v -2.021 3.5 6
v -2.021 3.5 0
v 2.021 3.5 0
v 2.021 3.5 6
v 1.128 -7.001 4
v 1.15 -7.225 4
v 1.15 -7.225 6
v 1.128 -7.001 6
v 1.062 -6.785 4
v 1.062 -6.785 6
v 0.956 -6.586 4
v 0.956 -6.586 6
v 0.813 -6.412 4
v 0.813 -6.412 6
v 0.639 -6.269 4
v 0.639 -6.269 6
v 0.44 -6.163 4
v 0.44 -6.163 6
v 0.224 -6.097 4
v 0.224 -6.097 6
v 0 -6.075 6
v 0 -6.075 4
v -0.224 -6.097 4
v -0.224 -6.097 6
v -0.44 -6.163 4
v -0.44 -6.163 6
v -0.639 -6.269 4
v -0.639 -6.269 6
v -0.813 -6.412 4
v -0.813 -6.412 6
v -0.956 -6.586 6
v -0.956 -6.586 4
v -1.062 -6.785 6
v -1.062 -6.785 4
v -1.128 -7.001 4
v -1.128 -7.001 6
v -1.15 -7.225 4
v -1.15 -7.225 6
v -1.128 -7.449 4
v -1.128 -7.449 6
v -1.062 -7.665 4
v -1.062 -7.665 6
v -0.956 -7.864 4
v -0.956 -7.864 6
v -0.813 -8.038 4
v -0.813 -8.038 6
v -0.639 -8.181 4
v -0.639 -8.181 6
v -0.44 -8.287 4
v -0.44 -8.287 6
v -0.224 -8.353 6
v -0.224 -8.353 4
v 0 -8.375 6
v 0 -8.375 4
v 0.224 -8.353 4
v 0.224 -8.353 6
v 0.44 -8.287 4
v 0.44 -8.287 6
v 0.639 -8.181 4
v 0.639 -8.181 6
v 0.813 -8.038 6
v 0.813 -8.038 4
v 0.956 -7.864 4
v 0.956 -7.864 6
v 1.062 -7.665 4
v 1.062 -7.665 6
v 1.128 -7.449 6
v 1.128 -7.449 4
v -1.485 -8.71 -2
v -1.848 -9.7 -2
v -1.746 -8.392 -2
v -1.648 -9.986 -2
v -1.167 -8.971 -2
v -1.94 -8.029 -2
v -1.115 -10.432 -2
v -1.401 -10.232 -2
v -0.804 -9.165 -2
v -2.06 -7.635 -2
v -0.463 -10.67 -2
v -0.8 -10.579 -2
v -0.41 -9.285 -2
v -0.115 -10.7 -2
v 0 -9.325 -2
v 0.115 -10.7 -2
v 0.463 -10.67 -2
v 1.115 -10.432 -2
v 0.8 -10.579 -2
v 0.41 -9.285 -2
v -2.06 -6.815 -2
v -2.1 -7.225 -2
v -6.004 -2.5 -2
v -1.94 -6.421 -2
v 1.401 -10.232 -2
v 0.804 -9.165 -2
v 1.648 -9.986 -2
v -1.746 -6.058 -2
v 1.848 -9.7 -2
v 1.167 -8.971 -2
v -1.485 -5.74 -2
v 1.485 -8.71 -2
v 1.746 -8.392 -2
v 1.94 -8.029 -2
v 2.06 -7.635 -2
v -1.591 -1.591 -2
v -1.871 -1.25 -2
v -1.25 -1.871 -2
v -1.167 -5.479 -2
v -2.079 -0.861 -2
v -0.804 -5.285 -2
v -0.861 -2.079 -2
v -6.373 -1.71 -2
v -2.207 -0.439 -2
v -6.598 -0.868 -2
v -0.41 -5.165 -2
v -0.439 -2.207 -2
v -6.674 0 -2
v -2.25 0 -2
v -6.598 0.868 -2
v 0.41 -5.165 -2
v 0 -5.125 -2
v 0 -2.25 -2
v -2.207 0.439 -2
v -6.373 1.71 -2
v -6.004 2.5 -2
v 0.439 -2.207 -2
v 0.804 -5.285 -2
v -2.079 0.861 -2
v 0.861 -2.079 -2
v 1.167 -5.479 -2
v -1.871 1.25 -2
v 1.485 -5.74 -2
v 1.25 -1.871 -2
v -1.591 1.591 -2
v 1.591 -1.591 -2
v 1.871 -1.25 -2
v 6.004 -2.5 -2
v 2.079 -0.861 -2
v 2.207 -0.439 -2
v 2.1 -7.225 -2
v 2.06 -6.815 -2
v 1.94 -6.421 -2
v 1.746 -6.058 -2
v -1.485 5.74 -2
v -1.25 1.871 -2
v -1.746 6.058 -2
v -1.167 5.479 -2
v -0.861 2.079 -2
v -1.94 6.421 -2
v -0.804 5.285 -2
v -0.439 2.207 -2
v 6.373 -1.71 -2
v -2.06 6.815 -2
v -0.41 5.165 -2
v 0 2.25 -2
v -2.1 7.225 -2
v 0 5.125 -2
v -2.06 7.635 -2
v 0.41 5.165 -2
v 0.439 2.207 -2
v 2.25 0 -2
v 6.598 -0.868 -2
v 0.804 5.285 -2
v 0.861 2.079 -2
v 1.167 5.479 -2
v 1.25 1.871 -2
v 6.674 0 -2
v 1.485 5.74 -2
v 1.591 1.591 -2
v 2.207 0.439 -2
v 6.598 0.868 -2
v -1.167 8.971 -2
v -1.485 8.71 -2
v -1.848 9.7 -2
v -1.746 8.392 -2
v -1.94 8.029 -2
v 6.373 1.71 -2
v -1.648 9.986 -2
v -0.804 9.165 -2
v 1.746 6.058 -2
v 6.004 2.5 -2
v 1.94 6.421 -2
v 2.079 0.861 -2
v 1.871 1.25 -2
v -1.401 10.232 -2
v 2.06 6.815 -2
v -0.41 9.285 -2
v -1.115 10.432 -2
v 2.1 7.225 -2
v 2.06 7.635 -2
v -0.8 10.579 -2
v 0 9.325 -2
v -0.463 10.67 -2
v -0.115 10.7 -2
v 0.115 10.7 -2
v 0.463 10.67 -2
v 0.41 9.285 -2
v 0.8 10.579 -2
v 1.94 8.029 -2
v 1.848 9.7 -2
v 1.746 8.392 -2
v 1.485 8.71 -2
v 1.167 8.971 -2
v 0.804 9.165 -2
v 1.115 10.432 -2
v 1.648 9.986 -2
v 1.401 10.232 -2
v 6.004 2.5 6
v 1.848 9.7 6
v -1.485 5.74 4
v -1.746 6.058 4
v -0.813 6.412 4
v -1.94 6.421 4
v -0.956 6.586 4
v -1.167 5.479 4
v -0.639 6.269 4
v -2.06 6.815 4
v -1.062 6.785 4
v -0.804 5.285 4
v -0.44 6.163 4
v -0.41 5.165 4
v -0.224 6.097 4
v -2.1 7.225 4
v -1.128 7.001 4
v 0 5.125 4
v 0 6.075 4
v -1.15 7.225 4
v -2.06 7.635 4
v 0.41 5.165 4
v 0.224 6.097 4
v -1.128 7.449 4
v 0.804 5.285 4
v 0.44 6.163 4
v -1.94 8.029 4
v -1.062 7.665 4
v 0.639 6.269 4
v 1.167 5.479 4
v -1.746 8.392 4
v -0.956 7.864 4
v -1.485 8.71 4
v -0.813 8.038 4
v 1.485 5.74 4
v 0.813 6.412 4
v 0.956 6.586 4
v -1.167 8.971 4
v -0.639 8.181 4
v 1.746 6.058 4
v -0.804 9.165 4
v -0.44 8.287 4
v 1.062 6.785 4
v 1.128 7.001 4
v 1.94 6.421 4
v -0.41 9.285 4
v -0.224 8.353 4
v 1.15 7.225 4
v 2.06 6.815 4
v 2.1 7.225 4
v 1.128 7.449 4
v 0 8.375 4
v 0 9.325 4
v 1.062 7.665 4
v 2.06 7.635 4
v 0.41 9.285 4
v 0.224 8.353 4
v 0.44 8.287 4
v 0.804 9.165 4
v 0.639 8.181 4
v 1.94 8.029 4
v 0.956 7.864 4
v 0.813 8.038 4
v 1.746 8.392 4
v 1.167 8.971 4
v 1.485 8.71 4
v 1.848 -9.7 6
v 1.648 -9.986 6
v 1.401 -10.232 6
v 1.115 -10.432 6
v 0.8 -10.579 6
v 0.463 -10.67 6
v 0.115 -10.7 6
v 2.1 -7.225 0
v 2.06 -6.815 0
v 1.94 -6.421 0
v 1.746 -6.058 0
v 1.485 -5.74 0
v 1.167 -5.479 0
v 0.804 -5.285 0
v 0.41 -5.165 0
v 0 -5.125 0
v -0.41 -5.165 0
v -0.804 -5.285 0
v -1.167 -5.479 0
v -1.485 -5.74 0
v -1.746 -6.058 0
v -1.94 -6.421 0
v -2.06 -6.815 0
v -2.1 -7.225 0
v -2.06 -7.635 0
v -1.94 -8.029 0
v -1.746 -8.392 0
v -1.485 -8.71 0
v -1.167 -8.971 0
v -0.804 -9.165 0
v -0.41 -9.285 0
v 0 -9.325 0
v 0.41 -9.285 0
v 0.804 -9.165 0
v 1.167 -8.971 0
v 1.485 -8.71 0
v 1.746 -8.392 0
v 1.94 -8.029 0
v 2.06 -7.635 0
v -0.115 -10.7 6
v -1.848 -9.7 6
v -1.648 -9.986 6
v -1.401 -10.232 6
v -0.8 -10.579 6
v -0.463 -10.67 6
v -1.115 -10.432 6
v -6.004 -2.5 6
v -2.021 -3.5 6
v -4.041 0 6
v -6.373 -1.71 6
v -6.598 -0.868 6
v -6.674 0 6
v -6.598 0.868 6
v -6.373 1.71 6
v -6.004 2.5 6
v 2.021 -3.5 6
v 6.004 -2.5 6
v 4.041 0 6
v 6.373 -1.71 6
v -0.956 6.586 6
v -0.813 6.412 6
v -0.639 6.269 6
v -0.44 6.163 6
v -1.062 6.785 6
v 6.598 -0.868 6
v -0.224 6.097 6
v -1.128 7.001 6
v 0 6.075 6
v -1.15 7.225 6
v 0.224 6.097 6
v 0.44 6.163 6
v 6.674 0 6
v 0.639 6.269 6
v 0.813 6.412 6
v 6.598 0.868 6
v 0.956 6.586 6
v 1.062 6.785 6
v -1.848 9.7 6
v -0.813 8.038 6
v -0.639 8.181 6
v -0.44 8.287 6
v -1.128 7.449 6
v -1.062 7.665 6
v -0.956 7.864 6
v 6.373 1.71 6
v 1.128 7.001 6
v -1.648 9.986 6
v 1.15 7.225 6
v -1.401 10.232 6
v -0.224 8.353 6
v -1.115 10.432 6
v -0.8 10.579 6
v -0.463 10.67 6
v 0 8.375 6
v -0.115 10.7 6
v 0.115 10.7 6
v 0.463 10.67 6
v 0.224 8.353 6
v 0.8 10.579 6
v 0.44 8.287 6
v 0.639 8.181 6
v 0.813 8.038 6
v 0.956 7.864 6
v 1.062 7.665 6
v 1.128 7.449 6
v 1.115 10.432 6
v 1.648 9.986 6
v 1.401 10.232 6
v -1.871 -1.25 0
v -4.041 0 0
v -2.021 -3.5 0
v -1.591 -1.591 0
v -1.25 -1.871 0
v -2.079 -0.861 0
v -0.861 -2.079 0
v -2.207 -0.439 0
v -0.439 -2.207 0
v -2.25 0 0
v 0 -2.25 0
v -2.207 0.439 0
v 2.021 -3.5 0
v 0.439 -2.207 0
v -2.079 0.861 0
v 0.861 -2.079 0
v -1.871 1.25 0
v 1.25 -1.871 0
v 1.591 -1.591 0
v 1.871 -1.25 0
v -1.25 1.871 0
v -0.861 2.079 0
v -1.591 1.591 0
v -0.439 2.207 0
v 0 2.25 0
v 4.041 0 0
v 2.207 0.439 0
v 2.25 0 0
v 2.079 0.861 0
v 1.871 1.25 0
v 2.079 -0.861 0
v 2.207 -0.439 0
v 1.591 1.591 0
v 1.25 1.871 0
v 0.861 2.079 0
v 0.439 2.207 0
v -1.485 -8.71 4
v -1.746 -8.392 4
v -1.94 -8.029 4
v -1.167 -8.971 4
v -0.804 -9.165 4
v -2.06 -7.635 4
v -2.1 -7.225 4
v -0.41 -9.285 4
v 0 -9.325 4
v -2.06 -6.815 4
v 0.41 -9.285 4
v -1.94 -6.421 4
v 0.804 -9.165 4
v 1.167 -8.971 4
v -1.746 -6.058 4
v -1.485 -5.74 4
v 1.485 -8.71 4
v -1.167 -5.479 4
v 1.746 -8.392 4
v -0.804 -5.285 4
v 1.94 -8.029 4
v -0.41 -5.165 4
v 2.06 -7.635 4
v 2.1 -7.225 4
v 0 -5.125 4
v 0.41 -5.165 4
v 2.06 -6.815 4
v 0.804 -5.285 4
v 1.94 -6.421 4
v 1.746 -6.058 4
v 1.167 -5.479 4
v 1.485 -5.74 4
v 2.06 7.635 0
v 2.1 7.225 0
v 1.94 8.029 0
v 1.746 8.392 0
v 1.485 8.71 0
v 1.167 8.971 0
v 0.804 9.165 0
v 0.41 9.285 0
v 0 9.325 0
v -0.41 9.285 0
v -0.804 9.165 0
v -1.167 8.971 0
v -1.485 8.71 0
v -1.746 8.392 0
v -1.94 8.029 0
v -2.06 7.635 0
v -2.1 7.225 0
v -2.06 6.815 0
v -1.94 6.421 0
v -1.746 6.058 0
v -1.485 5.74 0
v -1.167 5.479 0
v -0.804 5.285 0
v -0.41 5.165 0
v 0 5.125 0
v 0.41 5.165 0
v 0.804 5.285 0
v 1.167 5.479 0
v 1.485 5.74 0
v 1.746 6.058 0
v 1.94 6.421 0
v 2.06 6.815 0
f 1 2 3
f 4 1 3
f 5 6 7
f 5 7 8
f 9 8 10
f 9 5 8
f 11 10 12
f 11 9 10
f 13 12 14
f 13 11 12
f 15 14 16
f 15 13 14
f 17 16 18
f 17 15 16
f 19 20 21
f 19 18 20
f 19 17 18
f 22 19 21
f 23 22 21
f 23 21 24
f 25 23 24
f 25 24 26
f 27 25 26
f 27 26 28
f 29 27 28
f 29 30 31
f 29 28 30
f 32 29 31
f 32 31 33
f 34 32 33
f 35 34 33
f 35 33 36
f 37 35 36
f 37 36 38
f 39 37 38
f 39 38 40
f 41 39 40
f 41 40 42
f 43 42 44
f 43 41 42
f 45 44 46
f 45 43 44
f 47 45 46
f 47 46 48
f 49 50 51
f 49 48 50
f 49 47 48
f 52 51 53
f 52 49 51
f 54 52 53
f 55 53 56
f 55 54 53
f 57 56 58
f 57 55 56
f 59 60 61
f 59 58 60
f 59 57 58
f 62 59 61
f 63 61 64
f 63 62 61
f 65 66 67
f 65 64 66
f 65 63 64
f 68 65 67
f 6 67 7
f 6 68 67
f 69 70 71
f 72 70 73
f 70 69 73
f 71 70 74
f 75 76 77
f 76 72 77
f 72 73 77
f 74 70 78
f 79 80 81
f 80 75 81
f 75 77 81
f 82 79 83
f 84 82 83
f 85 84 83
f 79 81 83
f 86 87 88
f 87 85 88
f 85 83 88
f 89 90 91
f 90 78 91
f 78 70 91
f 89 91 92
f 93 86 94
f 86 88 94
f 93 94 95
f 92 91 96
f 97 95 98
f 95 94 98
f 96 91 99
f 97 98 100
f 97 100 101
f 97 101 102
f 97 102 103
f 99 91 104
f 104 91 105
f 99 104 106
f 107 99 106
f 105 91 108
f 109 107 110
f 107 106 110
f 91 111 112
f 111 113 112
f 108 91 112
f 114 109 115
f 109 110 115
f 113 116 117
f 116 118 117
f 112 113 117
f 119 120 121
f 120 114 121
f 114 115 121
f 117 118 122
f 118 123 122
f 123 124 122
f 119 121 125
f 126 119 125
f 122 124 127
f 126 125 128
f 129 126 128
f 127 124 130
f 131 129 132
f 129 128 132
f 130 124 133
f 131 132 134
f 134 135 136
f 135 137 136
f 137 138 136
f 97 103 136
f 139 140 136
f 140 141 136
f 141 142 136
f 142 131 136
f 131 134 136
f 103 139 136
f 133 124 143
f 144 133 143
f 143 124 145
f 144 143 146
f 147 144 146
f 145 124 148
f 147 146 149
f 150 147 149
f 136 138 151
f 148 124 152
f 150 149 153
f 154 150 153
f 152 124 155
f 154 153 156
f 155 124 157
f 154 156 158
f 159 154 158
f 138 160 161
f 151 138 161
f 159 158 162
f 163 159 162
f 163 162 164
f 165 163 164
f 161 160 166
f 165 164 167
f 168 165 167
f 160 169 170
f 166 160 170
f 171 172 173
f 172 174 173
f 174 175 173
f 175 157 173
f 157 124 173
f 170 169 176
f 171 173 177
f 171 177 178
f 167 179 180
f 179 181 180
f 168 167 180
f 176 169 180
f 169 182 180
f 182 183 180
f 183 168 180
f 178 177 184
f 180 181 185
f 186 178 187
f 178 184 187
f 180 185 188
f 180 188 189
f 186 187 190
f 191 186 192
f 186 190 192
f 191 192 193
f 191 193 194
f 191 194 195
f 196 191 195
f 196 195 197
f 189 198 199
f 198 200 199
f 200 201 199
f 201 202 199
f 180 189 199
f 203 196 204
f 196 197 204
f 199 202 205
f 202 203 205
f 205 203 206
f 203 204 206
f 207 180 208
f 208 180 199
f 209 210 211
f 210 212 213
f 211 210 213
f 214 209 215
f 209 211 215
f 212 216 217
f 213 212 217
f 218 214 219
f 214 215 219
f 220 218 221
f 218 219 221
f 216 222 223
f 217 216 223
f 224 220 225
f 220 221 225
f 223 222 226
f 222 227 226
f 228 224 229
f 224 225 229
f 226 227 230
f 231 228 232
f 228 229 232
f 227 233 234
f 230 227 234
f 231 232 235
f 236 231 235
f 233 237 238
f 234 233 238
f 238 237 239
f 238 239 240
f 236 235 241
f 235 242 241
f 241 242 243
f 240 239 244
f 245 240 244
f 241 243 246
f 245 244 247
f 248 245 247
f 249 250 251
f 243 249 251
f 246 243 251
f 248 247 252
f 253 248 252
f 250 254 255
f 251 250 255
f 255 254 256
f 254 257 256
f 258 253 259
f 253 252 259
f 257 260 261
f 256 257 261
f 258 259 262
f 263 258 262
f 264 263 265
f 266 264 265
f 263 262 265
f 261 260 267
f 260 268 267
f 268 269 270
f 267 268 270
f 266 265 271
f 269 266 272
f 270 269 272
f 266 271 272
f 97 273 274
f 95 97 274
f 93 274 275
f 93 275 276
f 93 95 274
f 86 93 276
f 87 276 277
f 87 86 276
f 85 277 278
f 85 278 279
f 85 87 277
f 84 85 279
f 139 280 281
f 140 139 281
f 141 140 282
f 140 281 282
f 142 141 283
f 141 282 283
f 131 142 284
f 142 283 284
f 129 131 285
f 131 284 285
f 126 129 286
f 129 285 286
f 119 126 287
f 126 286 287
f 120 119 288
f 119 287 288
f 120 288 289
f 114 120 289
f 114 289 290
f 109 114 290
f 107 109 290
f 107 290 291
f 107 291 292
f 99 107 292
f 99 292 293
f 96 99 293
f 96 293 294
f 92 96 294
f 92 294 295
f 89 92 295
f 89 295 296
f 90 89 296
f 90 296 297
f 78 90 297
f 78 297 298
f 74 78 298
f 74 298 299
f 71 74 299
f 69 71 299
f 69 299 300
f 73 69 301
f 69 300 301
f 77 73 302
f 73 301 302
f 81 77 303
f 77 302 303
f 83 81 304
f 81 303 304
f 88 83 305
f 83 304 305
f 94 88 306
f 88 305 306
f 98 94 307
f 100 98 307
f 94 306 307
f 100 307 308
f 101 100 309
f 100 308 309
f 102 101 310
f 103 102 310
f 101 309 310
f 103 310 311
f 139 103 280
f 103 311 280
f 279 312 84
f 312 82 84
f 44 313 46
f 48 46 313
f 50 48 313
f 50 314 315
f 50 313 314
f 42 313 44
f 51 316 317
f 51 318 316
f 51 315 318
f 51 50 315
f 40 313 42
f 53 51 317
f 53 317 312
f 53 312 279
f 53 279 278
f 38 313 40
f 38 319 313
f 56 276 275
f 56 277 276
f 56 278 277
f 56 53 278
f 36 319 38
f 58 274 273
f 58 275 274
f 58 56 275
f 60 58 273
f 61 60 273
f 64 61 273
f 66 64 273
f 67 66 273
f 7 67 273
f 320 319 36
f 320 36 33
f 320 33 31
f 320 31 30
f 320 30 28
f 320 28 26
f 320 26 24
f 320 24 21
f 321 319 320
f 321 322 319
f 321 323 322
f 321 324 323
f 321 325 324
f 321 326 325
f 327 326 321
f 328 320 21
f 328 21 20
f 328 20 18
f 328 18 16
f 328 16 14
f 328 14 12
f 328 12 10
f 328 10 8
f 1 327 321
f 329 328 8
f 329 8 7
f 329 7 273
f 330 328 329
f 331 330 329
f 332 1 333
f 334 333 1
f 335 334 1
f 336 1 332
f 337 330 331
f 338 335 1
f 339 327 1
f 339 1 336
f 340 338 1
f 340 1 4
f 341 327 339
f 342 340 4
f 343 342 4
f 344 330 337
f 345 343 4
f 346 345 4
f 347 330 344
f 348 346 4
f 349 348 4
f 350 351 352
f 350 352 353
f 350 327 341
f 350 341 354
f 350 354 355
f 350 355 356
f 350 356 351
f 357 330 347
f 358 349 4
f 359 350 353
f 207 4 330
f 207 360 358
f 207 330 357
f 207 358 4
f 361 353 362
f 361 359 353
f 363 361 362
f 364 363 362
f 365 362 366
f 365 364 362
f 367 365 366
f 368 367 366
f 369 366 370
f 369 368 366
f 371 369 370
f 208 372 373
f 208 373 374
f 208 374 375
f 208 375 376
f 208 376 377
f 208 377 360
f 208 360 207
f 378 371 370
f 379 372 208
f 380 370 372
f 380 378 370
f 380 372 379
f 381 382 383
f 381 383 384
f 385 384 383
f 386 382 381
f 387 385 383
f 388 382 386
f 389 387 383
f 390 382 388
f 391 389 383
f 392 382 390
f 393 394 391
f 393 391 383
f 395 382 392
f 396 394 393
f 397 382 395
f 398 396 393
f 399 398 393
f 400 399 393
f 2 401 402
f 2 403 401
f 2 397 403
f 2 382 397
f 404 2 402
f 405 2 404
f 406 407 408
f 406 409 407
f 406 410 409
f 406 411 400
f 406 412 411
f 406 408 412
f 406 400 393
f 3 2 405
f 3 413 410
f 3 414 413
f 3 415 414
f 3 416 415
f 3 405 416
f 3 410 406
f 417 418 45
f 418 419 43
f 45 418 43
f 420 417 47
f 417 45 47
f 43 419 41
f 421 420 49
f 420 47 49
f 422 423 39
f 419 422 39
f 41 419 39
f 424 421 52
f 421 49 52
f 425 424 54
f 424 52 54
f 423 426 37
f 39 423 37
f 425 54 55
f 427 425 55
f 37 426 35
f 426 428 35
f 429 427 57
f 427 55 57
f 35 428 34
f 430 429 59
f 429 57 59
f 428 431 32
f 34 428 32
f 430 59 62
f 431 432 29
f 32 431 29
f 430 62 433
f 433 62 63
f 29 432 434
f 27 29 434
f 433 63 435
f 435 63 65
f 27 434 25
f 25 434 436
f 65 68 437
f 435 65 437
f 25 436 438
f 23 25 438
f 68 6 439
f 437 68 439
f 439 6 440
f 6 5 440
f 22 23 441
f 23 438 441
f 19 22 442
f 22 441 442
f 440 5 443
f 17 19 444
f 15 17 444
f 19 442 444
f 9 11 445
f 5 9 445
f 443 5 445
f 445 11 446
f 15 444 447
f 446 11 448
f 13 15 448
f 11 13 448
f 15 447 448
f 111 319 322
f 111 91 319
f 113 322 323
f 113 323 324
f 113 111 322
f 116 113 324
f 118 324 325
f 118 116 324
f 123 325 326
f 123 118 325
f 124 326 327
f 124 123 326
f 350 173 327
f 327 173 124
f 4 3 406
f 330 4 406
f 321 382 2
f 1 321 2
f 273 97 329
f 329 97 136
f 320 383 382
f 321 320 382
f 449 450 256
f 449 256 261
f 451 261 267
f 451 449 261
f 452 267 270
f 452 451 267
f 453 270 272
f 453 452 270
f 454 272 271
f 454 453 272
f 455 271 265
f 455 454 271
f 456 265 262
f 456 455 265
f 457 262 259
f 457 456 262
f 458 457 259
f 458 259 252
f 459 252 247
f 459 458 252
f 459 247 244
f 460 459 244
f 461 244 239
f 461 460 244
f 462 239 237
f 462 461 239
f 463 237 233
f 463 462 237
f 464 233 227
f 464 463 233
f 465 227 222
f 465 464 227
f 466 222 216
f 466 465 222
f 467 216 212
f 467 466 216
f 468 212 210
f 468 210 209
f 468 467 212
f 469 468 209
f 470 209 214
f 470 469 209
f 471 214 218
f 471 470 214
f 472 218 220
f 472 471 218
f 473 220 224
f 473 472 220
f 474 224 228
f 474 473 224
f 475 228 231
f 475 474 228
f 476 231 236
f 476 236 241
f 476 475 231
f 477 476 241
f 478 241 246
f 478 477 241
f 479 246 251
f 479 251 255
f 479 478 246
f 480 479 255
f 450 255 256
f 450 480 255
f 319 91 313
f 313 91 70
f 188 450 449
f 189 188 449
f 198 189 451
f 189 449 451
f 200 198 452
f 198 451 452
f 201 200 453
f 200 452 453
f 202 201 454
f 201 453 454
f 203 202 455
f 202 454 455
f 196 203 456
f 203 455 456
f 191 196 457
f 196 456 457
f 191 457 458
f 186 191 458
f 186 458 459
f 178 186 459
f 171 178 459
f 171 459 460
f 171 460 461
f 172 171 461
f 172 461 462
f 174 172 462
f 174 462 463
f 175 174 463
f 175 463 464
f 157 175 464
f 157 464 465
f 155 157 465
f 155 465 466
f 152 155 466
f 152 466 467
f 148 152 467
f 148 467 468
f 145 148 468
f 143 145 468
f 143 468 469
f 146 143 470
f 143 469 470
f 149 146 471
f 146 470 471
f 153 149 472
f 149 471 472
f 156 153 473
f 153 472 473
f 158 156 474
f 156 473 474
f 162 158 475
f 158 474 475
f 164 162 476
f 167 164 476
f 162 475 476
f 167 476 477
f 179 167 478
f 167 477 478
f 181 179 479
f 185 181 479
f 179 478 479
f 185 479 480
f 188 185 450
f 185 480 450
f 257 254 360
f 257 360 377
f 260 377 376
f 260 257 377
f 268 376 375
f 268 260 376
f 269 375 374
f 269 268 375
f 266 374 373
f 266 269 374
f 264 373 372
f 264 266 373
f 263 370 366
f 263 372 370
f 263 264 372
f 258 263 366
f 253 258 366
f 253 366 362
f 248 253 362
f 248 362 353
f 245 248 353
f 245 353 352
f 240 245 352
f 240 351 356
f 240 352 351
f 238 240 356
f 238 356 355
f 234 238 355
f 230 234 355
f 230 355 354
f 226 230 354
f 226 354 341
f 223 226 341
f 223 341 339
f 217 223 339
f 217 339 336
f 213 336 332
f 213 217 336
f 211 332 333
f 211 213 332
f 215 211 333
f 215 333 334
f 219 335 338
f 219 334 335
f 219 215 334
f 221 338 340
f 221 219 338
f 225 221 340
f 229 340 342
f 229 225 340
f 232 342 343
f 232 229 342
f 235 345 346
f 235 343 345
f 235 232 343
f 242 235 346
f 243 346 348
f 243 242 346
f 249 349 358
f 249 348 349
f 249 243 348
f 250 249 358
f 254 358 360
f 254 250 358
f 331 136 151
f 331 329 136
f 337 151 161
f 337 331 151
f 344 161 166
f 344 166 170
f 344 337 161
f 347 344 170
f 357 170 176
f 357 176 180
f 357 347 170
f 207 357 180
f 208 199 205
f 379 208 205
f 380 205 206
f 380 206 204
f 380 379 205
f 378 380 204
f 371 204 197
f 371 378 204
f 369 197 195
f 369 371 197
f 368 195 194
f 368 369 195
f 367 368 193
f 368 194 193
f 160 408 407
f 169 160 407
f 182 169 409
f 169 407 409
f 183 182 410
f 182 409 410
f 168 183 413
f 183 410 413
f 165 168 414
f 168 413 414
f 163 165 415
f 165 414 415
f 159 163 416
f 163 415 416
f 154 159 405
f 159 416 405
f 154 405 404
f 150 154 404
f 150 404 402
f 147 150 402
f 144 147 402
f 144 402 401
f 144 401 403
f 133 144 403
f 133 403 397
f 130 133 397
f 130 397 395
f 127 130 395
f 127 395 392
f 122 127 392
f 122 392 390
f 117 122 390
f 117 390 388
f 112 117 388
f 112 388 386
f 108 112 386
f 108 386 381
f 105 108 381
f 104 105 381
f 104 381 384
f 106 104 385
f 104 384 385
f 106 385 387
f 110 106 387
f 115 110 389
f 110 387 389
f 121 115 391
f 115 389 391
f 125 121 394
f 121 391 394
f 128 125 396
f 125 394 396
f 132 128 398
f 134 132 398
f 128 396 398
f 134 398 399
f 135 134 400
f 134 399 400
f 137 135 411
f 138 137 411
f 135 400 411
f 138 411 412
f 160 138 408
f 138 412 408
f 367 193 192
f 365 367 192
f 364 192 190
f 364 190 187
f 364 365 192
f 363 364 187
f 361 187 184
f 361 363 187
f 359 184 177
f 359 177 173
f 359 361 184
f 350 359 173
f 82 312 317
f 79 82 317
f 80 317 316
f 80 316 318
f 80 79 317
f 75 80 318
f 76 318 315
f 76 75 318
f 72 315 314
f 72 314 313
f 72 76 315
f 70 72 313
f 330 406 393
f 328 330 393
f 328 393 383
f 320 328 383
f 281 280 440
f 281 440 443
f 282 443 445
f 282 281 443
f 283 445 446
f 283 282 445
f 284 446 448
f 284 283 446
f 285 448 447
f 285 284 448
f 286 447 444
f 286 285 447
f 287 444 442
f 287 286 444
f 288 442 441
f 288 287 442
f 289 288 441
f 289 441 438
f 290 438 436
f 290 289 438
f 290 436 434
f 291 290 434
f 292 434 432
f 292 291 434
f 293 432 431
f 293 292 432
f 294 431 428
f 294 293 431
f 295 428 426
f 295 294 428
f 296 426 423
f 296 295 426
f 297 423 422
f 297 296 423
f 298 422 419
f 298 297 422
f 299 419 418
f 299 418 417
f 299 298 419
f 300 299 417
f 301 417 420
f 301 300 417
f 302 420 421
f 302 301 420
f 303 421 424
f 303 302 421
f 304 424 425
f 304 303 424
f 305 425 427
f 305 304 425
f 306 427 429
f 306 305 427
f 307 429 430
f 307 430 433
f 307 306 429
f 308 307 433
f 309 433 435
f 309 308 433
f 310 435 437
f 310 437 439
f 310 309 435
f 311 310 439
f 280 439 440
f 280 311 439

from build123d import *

# Parameters (mm, degrees)
F2_DEPTH      = 2
F7_DEPTH      = 6
F3_R          = 1.15
F8_DEPTH      = 2.001
F8_DEPTH_BACK = 6.001
F4_R          = 2.1
F9_DEPTH      = 2.001
F9_DEPTH_BACK = 4
F6_R          = 2.25
F10_DEPTH     = 2.001
F11_R         = 5
F12_R         = 2


with BuildPart() as f2:
    # F1 (on Top) → F2 (new body)
    with BuildSketch(Plane.XY):
        Polygon((1.2701705922, 10.7), (0, 10.7), (-1.2701705922, 10.7), (-7.4478184725, 0), (-1.2701705922, -10.7), (0, -10.7), (1.2701705922, -10.7), (7.4478184725, 0), align=None)
    extrude(amount=-F2_DEPTH)

    # F5 (on Top) → F7 (join)
    with BuildSketch(Plane.XY):
        Polygon((1.2701705922, -10.7), (7.4478184725, 0), (1.2701705922, 10.7), (0, 10.7), (-1.2701705922, 10.7), (-7.4478184725, 0), (-1.2701705922, -10.7), (0, -10.7), align=None)
        Polygon((2.0207259422, 3.5), (4.0414518843, 0), (2.0207259422, -3.5), (0, -3.5), (-2.0207259422, -3.5), (-4.0414518843, 0), (-2.0207259422, 3.5), (0, 3.5), align=None, mode=Mode.SUBTRACT)
    extrude(amount=F7_DEPTH)

    # F3 (on Top) → F8 (cut, two sides)
    with BuildSketch(Plane.XY) as f8_sk:
        with Locations((0, 7.225)):
            Circle(F3_R)
        with Locations((0, -7.225)):
            Circle(F3_R)
    extrude(amount=-F8_DEPTH, mode=Mode.SUBTRACT)
    extrude(f8_sk.sketch, amount=F8_DEPTH_BACK, mode=Mode.SUBTRACT)

    # F4 (on Top) → F9 (cut, two sides)
    with BuildSketch(Plane.XY) as f9_sk:
        with Locations((0, 7.225)):
            Circle(F4_R)
        with Locations((0, -7.225)):
            Circle(F4_R)
    extrude(amount=-F9_DEPTH, mode=Mode.SUBTRACT)
    extrude(f9_sk.sketch, amount=F9_DEPTH_BACK, mode=Mode.SUBTRACT)

    # F6 (on Top) → F10 (cut, through all)
    with BuildSketch(Plane.XY):
        Circle(F6_R)
    extrude(amount=-F10_DEPTH, mode=Mode.SUBTRACT)

    # F11
    f11_edges = [f2.edges().sort_by_distance(p)[0] for p in [
        (7.447818, 0, 2),
        (-7.447818, 0, 2),
    ]]
    fillet(f11_edges, radius=F11_R)

    # F12
    f12_edges = [f2.edges().sort_by_distance(p)[0] for p in [
        (1.270171, -10.7, 2),
        (-1.270171, -10.7, 2),
        (-1.270171, 10.7, 2),
        (1.270171, 10.7, 2),
    ]]
    fillet(f12_edges, radius=F12_R)


solid = f2.part
